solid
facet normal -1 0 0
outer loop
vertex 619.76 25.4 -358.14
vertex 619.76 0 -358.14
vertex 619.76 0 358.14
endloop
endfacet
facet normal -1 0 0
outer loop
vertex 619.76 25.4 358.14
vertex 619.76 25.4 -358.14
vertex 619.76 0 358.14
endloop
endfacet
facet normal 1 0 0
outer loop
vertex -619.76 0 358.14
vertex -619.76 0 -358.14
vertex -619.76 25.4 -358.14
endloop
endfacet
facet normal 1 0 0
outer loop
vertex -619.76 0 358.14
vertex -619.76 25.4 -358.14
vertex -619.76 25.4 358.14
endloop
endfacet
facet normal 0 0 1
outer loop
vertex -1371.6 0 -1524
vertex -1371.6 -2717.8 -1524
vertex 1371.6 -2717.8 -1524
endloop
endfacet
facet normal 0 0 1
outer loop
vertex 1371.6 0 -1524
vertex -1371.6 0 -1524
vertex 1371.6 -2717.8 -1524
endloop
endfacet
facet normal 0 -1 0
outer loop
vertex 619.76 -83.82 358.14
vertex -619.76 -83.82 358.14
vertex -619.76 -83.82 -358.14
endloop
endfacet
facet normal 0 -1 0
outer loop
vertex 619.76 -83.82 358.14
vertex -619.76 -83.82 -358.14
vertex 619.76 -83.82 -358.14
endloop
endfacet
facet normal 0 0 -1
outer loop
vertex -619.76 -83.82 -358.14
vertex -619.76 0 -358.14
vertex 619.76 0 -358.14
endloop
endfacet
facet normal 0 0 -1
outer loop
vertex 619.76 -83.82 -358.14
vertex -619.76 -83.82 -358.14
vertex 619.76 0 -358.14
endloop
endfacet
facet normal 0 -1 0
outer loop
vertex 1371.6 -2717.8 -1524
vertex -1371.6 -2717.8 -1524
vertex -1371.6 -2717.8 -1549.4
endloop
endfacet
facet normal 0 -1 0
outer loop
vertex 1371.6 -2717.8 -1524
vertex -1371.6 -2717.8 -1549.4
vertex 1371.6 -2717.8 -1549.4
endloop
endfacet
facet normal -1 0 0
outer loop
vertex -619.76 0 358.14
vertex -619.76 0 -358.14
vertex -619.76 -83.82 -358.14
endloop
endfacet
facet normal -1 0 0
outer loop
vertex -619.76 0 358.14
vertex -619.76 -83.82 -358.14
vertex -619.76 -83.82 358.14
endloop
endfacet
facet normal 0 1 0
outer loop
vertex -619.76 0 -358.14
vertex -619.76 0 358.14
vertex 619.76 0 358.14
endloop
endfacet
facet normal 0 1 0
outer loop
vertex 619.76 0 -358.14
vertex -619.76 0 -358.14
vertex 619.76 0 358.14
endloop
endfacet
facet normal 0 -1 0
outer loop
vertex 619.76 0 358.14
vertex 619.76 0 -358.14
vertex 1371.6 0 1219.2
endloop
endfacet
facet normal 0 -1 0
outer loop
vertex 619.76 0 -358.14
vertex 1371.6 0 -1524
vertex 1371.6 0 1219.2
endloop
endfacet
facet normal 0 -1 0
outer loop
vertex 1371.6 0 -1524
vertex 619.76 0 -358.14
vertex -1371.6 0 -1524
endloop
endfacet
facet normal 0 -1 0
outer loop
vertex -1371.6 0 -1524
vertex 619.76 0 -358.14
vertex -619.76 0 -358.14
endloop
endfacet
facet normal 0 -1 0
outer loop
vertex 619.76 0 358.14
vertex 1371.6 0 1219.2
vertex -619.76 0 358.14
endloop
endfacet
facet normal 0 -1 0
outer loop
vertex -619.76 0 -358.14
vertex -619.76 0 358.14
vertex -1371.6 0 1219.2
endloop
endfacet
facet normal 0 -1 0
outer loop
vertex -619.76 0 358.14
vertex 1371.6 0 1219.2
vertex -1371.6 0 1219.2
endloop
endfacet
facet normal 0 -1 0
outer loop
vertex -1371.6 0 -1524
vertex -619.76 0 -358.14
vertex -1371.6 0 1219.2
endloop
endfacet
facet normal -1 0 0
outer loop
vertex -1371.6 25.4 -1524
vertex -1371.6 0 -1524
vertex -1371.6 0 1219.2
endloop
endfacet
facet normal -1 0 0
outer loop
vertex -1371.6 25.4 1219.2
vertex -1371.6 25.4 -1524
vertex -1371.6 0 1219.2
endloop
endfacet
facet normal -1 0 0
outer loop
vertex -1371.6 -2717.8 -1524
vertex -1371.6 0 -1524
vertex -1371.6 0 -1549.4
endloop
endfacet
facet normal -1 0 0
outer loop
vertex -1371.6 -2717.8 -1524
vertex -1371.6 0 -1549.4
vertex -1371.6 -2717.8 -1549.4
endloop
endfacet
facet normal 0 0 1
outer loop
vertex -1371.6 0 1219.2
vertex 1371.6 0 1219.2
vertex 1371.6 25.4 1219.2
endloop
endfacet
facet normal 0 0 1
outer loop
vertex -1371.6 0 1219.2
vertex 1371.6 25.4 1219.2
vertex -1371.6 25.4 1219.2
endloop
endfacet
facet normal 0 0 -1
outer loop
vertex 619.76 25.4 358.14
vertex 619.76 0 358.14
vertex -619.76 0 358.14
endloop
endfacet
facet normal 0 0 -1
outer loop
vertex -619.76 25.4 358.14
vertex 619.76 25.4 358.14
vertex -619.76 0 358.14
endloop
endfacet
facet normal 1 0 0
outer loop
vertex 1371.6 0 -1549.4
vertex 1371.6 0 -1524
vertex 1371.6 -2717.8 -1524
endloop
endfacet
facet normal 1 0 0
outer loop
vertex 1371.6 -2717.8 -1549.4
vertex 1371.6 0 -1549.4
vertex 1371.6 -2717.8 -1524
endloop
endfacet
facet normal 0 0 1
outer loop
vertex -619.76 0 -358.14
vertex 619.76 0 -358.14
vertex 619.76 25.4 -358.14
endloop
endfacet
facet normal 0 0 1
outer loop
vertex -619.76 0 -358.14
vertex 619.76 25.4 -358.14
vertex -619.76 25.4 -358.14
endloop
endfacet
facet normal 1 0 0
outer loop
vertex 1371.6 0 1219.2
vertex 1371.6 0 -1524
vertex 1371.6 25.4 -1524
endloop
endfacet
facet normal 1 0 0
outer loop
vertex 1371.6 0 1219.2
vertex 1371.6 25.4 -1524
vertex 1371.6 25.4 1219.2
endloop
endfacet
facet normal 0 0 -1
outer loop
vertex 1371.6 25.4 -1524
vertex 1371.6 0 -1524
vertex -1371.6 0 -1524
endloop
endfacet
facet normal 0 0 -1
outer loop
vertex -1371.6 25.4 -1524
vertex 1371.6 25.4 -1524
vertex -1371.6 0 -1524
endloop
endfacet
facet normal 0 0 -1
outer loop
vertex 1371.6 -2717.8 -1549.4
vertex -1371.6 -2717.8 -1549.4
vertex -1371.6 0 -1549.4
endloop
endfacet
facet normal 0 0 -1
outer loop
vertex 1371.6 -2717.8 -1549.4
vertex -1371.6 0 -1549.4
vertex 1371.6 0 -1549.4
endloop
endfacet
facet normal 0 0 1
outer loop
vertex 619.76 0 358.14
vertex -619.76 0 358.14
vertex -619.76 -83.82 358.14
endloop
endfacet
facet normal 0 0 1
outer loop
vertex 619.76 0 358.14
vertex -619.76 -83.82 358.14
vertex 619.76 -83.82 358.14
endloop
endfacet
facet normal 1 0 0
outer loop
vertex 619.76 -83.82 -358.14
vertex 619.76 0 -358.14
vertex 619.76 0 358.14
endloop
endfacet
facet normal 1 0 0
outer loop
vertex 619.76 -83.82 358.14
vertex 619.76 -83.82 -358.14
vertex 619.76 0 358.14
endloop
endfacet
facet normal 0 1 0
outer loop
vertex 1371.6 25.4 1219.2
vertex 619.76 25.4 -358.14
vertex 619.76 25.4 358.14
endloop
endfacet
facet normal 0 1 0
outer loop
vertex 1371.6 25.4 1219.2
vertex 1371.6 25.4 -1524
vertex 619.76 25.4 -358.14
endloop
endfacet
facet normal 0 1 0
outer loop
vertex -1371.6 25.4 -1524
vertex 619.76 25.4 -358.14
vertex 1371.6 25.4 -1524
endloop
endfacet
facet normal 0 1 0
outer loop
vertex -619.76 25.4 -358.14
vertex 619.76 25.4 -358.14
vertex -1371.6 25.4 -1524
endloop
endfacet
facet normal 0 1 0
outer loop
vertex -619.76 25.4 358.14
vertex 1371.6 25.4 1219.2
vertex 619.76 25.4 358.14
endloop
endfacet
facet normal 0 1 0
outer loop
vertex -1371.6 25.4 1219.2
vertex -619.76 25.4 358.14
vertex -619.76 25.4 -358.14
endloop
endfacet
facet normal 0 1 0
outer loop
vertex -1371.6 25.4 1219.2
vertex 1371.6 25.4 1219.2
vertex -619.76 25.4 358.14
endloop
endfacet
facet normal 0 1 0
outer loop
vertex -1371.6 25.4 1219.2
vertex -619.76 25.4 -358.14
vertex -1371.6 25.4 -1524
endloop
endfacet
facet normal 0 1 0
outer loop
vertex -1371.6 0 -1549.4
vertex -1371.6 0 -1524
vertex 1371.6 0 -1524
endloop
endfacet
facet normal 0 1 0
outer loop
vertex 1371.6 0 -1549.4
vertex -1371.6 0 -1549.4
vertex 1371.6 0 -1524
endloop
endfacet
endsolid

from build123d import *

# Parameters (mm, degrees)
F0_W     = 1239.52
F0_H     = 716.28
F1_DEPTH = 83.82
F2_W     = 2743.2
F2_H     = 2743.2
F2_W_2   = 1239.52
F2_H_2   = 716.28
F3_DEPTH = 25.4
F4_W     = 2743.2
F4_H     = 2717.8
F5_DEPTH = 25.4


with BuildPart() as f1:
    # F0 (on Front) → F1 (new body)
    with BuildSketch(Plane.XZ):
        Rectangle(F0_W, F0_H)
    extrude(amount=F1_DEPTH)


with BuildPart() as f3:
    # F2 (on face) → F3 (new body)
    with BuildSketch(Plane(origin=(0, 0, 0), x_dir=(-1, 0, 0), z_dir=(0, 1, 0))):
        with Locations((0, -152.4)):
            Rectangle(F2_W, F2_H)
        Rectangle(F2_W_2, F2_H_2, mode=Mode.SUBTRACT)
    extrude(amount=F3_DEPTH)


with BuildPart() as f5:
    # F4 (on face) → F5 (new body)
    with BuildSketch(Plane(origin=(0, 0, -1524), x_dir=(1, 0, 0), z_dir=(0, 0, -1))):
        with Locations((0, 1358.9)):
            Rectangle(F4_W, F4_H)
    extrude(amount=F5_DEPTH)


solid = Compound([f1.part, f3.part, f5.part])
